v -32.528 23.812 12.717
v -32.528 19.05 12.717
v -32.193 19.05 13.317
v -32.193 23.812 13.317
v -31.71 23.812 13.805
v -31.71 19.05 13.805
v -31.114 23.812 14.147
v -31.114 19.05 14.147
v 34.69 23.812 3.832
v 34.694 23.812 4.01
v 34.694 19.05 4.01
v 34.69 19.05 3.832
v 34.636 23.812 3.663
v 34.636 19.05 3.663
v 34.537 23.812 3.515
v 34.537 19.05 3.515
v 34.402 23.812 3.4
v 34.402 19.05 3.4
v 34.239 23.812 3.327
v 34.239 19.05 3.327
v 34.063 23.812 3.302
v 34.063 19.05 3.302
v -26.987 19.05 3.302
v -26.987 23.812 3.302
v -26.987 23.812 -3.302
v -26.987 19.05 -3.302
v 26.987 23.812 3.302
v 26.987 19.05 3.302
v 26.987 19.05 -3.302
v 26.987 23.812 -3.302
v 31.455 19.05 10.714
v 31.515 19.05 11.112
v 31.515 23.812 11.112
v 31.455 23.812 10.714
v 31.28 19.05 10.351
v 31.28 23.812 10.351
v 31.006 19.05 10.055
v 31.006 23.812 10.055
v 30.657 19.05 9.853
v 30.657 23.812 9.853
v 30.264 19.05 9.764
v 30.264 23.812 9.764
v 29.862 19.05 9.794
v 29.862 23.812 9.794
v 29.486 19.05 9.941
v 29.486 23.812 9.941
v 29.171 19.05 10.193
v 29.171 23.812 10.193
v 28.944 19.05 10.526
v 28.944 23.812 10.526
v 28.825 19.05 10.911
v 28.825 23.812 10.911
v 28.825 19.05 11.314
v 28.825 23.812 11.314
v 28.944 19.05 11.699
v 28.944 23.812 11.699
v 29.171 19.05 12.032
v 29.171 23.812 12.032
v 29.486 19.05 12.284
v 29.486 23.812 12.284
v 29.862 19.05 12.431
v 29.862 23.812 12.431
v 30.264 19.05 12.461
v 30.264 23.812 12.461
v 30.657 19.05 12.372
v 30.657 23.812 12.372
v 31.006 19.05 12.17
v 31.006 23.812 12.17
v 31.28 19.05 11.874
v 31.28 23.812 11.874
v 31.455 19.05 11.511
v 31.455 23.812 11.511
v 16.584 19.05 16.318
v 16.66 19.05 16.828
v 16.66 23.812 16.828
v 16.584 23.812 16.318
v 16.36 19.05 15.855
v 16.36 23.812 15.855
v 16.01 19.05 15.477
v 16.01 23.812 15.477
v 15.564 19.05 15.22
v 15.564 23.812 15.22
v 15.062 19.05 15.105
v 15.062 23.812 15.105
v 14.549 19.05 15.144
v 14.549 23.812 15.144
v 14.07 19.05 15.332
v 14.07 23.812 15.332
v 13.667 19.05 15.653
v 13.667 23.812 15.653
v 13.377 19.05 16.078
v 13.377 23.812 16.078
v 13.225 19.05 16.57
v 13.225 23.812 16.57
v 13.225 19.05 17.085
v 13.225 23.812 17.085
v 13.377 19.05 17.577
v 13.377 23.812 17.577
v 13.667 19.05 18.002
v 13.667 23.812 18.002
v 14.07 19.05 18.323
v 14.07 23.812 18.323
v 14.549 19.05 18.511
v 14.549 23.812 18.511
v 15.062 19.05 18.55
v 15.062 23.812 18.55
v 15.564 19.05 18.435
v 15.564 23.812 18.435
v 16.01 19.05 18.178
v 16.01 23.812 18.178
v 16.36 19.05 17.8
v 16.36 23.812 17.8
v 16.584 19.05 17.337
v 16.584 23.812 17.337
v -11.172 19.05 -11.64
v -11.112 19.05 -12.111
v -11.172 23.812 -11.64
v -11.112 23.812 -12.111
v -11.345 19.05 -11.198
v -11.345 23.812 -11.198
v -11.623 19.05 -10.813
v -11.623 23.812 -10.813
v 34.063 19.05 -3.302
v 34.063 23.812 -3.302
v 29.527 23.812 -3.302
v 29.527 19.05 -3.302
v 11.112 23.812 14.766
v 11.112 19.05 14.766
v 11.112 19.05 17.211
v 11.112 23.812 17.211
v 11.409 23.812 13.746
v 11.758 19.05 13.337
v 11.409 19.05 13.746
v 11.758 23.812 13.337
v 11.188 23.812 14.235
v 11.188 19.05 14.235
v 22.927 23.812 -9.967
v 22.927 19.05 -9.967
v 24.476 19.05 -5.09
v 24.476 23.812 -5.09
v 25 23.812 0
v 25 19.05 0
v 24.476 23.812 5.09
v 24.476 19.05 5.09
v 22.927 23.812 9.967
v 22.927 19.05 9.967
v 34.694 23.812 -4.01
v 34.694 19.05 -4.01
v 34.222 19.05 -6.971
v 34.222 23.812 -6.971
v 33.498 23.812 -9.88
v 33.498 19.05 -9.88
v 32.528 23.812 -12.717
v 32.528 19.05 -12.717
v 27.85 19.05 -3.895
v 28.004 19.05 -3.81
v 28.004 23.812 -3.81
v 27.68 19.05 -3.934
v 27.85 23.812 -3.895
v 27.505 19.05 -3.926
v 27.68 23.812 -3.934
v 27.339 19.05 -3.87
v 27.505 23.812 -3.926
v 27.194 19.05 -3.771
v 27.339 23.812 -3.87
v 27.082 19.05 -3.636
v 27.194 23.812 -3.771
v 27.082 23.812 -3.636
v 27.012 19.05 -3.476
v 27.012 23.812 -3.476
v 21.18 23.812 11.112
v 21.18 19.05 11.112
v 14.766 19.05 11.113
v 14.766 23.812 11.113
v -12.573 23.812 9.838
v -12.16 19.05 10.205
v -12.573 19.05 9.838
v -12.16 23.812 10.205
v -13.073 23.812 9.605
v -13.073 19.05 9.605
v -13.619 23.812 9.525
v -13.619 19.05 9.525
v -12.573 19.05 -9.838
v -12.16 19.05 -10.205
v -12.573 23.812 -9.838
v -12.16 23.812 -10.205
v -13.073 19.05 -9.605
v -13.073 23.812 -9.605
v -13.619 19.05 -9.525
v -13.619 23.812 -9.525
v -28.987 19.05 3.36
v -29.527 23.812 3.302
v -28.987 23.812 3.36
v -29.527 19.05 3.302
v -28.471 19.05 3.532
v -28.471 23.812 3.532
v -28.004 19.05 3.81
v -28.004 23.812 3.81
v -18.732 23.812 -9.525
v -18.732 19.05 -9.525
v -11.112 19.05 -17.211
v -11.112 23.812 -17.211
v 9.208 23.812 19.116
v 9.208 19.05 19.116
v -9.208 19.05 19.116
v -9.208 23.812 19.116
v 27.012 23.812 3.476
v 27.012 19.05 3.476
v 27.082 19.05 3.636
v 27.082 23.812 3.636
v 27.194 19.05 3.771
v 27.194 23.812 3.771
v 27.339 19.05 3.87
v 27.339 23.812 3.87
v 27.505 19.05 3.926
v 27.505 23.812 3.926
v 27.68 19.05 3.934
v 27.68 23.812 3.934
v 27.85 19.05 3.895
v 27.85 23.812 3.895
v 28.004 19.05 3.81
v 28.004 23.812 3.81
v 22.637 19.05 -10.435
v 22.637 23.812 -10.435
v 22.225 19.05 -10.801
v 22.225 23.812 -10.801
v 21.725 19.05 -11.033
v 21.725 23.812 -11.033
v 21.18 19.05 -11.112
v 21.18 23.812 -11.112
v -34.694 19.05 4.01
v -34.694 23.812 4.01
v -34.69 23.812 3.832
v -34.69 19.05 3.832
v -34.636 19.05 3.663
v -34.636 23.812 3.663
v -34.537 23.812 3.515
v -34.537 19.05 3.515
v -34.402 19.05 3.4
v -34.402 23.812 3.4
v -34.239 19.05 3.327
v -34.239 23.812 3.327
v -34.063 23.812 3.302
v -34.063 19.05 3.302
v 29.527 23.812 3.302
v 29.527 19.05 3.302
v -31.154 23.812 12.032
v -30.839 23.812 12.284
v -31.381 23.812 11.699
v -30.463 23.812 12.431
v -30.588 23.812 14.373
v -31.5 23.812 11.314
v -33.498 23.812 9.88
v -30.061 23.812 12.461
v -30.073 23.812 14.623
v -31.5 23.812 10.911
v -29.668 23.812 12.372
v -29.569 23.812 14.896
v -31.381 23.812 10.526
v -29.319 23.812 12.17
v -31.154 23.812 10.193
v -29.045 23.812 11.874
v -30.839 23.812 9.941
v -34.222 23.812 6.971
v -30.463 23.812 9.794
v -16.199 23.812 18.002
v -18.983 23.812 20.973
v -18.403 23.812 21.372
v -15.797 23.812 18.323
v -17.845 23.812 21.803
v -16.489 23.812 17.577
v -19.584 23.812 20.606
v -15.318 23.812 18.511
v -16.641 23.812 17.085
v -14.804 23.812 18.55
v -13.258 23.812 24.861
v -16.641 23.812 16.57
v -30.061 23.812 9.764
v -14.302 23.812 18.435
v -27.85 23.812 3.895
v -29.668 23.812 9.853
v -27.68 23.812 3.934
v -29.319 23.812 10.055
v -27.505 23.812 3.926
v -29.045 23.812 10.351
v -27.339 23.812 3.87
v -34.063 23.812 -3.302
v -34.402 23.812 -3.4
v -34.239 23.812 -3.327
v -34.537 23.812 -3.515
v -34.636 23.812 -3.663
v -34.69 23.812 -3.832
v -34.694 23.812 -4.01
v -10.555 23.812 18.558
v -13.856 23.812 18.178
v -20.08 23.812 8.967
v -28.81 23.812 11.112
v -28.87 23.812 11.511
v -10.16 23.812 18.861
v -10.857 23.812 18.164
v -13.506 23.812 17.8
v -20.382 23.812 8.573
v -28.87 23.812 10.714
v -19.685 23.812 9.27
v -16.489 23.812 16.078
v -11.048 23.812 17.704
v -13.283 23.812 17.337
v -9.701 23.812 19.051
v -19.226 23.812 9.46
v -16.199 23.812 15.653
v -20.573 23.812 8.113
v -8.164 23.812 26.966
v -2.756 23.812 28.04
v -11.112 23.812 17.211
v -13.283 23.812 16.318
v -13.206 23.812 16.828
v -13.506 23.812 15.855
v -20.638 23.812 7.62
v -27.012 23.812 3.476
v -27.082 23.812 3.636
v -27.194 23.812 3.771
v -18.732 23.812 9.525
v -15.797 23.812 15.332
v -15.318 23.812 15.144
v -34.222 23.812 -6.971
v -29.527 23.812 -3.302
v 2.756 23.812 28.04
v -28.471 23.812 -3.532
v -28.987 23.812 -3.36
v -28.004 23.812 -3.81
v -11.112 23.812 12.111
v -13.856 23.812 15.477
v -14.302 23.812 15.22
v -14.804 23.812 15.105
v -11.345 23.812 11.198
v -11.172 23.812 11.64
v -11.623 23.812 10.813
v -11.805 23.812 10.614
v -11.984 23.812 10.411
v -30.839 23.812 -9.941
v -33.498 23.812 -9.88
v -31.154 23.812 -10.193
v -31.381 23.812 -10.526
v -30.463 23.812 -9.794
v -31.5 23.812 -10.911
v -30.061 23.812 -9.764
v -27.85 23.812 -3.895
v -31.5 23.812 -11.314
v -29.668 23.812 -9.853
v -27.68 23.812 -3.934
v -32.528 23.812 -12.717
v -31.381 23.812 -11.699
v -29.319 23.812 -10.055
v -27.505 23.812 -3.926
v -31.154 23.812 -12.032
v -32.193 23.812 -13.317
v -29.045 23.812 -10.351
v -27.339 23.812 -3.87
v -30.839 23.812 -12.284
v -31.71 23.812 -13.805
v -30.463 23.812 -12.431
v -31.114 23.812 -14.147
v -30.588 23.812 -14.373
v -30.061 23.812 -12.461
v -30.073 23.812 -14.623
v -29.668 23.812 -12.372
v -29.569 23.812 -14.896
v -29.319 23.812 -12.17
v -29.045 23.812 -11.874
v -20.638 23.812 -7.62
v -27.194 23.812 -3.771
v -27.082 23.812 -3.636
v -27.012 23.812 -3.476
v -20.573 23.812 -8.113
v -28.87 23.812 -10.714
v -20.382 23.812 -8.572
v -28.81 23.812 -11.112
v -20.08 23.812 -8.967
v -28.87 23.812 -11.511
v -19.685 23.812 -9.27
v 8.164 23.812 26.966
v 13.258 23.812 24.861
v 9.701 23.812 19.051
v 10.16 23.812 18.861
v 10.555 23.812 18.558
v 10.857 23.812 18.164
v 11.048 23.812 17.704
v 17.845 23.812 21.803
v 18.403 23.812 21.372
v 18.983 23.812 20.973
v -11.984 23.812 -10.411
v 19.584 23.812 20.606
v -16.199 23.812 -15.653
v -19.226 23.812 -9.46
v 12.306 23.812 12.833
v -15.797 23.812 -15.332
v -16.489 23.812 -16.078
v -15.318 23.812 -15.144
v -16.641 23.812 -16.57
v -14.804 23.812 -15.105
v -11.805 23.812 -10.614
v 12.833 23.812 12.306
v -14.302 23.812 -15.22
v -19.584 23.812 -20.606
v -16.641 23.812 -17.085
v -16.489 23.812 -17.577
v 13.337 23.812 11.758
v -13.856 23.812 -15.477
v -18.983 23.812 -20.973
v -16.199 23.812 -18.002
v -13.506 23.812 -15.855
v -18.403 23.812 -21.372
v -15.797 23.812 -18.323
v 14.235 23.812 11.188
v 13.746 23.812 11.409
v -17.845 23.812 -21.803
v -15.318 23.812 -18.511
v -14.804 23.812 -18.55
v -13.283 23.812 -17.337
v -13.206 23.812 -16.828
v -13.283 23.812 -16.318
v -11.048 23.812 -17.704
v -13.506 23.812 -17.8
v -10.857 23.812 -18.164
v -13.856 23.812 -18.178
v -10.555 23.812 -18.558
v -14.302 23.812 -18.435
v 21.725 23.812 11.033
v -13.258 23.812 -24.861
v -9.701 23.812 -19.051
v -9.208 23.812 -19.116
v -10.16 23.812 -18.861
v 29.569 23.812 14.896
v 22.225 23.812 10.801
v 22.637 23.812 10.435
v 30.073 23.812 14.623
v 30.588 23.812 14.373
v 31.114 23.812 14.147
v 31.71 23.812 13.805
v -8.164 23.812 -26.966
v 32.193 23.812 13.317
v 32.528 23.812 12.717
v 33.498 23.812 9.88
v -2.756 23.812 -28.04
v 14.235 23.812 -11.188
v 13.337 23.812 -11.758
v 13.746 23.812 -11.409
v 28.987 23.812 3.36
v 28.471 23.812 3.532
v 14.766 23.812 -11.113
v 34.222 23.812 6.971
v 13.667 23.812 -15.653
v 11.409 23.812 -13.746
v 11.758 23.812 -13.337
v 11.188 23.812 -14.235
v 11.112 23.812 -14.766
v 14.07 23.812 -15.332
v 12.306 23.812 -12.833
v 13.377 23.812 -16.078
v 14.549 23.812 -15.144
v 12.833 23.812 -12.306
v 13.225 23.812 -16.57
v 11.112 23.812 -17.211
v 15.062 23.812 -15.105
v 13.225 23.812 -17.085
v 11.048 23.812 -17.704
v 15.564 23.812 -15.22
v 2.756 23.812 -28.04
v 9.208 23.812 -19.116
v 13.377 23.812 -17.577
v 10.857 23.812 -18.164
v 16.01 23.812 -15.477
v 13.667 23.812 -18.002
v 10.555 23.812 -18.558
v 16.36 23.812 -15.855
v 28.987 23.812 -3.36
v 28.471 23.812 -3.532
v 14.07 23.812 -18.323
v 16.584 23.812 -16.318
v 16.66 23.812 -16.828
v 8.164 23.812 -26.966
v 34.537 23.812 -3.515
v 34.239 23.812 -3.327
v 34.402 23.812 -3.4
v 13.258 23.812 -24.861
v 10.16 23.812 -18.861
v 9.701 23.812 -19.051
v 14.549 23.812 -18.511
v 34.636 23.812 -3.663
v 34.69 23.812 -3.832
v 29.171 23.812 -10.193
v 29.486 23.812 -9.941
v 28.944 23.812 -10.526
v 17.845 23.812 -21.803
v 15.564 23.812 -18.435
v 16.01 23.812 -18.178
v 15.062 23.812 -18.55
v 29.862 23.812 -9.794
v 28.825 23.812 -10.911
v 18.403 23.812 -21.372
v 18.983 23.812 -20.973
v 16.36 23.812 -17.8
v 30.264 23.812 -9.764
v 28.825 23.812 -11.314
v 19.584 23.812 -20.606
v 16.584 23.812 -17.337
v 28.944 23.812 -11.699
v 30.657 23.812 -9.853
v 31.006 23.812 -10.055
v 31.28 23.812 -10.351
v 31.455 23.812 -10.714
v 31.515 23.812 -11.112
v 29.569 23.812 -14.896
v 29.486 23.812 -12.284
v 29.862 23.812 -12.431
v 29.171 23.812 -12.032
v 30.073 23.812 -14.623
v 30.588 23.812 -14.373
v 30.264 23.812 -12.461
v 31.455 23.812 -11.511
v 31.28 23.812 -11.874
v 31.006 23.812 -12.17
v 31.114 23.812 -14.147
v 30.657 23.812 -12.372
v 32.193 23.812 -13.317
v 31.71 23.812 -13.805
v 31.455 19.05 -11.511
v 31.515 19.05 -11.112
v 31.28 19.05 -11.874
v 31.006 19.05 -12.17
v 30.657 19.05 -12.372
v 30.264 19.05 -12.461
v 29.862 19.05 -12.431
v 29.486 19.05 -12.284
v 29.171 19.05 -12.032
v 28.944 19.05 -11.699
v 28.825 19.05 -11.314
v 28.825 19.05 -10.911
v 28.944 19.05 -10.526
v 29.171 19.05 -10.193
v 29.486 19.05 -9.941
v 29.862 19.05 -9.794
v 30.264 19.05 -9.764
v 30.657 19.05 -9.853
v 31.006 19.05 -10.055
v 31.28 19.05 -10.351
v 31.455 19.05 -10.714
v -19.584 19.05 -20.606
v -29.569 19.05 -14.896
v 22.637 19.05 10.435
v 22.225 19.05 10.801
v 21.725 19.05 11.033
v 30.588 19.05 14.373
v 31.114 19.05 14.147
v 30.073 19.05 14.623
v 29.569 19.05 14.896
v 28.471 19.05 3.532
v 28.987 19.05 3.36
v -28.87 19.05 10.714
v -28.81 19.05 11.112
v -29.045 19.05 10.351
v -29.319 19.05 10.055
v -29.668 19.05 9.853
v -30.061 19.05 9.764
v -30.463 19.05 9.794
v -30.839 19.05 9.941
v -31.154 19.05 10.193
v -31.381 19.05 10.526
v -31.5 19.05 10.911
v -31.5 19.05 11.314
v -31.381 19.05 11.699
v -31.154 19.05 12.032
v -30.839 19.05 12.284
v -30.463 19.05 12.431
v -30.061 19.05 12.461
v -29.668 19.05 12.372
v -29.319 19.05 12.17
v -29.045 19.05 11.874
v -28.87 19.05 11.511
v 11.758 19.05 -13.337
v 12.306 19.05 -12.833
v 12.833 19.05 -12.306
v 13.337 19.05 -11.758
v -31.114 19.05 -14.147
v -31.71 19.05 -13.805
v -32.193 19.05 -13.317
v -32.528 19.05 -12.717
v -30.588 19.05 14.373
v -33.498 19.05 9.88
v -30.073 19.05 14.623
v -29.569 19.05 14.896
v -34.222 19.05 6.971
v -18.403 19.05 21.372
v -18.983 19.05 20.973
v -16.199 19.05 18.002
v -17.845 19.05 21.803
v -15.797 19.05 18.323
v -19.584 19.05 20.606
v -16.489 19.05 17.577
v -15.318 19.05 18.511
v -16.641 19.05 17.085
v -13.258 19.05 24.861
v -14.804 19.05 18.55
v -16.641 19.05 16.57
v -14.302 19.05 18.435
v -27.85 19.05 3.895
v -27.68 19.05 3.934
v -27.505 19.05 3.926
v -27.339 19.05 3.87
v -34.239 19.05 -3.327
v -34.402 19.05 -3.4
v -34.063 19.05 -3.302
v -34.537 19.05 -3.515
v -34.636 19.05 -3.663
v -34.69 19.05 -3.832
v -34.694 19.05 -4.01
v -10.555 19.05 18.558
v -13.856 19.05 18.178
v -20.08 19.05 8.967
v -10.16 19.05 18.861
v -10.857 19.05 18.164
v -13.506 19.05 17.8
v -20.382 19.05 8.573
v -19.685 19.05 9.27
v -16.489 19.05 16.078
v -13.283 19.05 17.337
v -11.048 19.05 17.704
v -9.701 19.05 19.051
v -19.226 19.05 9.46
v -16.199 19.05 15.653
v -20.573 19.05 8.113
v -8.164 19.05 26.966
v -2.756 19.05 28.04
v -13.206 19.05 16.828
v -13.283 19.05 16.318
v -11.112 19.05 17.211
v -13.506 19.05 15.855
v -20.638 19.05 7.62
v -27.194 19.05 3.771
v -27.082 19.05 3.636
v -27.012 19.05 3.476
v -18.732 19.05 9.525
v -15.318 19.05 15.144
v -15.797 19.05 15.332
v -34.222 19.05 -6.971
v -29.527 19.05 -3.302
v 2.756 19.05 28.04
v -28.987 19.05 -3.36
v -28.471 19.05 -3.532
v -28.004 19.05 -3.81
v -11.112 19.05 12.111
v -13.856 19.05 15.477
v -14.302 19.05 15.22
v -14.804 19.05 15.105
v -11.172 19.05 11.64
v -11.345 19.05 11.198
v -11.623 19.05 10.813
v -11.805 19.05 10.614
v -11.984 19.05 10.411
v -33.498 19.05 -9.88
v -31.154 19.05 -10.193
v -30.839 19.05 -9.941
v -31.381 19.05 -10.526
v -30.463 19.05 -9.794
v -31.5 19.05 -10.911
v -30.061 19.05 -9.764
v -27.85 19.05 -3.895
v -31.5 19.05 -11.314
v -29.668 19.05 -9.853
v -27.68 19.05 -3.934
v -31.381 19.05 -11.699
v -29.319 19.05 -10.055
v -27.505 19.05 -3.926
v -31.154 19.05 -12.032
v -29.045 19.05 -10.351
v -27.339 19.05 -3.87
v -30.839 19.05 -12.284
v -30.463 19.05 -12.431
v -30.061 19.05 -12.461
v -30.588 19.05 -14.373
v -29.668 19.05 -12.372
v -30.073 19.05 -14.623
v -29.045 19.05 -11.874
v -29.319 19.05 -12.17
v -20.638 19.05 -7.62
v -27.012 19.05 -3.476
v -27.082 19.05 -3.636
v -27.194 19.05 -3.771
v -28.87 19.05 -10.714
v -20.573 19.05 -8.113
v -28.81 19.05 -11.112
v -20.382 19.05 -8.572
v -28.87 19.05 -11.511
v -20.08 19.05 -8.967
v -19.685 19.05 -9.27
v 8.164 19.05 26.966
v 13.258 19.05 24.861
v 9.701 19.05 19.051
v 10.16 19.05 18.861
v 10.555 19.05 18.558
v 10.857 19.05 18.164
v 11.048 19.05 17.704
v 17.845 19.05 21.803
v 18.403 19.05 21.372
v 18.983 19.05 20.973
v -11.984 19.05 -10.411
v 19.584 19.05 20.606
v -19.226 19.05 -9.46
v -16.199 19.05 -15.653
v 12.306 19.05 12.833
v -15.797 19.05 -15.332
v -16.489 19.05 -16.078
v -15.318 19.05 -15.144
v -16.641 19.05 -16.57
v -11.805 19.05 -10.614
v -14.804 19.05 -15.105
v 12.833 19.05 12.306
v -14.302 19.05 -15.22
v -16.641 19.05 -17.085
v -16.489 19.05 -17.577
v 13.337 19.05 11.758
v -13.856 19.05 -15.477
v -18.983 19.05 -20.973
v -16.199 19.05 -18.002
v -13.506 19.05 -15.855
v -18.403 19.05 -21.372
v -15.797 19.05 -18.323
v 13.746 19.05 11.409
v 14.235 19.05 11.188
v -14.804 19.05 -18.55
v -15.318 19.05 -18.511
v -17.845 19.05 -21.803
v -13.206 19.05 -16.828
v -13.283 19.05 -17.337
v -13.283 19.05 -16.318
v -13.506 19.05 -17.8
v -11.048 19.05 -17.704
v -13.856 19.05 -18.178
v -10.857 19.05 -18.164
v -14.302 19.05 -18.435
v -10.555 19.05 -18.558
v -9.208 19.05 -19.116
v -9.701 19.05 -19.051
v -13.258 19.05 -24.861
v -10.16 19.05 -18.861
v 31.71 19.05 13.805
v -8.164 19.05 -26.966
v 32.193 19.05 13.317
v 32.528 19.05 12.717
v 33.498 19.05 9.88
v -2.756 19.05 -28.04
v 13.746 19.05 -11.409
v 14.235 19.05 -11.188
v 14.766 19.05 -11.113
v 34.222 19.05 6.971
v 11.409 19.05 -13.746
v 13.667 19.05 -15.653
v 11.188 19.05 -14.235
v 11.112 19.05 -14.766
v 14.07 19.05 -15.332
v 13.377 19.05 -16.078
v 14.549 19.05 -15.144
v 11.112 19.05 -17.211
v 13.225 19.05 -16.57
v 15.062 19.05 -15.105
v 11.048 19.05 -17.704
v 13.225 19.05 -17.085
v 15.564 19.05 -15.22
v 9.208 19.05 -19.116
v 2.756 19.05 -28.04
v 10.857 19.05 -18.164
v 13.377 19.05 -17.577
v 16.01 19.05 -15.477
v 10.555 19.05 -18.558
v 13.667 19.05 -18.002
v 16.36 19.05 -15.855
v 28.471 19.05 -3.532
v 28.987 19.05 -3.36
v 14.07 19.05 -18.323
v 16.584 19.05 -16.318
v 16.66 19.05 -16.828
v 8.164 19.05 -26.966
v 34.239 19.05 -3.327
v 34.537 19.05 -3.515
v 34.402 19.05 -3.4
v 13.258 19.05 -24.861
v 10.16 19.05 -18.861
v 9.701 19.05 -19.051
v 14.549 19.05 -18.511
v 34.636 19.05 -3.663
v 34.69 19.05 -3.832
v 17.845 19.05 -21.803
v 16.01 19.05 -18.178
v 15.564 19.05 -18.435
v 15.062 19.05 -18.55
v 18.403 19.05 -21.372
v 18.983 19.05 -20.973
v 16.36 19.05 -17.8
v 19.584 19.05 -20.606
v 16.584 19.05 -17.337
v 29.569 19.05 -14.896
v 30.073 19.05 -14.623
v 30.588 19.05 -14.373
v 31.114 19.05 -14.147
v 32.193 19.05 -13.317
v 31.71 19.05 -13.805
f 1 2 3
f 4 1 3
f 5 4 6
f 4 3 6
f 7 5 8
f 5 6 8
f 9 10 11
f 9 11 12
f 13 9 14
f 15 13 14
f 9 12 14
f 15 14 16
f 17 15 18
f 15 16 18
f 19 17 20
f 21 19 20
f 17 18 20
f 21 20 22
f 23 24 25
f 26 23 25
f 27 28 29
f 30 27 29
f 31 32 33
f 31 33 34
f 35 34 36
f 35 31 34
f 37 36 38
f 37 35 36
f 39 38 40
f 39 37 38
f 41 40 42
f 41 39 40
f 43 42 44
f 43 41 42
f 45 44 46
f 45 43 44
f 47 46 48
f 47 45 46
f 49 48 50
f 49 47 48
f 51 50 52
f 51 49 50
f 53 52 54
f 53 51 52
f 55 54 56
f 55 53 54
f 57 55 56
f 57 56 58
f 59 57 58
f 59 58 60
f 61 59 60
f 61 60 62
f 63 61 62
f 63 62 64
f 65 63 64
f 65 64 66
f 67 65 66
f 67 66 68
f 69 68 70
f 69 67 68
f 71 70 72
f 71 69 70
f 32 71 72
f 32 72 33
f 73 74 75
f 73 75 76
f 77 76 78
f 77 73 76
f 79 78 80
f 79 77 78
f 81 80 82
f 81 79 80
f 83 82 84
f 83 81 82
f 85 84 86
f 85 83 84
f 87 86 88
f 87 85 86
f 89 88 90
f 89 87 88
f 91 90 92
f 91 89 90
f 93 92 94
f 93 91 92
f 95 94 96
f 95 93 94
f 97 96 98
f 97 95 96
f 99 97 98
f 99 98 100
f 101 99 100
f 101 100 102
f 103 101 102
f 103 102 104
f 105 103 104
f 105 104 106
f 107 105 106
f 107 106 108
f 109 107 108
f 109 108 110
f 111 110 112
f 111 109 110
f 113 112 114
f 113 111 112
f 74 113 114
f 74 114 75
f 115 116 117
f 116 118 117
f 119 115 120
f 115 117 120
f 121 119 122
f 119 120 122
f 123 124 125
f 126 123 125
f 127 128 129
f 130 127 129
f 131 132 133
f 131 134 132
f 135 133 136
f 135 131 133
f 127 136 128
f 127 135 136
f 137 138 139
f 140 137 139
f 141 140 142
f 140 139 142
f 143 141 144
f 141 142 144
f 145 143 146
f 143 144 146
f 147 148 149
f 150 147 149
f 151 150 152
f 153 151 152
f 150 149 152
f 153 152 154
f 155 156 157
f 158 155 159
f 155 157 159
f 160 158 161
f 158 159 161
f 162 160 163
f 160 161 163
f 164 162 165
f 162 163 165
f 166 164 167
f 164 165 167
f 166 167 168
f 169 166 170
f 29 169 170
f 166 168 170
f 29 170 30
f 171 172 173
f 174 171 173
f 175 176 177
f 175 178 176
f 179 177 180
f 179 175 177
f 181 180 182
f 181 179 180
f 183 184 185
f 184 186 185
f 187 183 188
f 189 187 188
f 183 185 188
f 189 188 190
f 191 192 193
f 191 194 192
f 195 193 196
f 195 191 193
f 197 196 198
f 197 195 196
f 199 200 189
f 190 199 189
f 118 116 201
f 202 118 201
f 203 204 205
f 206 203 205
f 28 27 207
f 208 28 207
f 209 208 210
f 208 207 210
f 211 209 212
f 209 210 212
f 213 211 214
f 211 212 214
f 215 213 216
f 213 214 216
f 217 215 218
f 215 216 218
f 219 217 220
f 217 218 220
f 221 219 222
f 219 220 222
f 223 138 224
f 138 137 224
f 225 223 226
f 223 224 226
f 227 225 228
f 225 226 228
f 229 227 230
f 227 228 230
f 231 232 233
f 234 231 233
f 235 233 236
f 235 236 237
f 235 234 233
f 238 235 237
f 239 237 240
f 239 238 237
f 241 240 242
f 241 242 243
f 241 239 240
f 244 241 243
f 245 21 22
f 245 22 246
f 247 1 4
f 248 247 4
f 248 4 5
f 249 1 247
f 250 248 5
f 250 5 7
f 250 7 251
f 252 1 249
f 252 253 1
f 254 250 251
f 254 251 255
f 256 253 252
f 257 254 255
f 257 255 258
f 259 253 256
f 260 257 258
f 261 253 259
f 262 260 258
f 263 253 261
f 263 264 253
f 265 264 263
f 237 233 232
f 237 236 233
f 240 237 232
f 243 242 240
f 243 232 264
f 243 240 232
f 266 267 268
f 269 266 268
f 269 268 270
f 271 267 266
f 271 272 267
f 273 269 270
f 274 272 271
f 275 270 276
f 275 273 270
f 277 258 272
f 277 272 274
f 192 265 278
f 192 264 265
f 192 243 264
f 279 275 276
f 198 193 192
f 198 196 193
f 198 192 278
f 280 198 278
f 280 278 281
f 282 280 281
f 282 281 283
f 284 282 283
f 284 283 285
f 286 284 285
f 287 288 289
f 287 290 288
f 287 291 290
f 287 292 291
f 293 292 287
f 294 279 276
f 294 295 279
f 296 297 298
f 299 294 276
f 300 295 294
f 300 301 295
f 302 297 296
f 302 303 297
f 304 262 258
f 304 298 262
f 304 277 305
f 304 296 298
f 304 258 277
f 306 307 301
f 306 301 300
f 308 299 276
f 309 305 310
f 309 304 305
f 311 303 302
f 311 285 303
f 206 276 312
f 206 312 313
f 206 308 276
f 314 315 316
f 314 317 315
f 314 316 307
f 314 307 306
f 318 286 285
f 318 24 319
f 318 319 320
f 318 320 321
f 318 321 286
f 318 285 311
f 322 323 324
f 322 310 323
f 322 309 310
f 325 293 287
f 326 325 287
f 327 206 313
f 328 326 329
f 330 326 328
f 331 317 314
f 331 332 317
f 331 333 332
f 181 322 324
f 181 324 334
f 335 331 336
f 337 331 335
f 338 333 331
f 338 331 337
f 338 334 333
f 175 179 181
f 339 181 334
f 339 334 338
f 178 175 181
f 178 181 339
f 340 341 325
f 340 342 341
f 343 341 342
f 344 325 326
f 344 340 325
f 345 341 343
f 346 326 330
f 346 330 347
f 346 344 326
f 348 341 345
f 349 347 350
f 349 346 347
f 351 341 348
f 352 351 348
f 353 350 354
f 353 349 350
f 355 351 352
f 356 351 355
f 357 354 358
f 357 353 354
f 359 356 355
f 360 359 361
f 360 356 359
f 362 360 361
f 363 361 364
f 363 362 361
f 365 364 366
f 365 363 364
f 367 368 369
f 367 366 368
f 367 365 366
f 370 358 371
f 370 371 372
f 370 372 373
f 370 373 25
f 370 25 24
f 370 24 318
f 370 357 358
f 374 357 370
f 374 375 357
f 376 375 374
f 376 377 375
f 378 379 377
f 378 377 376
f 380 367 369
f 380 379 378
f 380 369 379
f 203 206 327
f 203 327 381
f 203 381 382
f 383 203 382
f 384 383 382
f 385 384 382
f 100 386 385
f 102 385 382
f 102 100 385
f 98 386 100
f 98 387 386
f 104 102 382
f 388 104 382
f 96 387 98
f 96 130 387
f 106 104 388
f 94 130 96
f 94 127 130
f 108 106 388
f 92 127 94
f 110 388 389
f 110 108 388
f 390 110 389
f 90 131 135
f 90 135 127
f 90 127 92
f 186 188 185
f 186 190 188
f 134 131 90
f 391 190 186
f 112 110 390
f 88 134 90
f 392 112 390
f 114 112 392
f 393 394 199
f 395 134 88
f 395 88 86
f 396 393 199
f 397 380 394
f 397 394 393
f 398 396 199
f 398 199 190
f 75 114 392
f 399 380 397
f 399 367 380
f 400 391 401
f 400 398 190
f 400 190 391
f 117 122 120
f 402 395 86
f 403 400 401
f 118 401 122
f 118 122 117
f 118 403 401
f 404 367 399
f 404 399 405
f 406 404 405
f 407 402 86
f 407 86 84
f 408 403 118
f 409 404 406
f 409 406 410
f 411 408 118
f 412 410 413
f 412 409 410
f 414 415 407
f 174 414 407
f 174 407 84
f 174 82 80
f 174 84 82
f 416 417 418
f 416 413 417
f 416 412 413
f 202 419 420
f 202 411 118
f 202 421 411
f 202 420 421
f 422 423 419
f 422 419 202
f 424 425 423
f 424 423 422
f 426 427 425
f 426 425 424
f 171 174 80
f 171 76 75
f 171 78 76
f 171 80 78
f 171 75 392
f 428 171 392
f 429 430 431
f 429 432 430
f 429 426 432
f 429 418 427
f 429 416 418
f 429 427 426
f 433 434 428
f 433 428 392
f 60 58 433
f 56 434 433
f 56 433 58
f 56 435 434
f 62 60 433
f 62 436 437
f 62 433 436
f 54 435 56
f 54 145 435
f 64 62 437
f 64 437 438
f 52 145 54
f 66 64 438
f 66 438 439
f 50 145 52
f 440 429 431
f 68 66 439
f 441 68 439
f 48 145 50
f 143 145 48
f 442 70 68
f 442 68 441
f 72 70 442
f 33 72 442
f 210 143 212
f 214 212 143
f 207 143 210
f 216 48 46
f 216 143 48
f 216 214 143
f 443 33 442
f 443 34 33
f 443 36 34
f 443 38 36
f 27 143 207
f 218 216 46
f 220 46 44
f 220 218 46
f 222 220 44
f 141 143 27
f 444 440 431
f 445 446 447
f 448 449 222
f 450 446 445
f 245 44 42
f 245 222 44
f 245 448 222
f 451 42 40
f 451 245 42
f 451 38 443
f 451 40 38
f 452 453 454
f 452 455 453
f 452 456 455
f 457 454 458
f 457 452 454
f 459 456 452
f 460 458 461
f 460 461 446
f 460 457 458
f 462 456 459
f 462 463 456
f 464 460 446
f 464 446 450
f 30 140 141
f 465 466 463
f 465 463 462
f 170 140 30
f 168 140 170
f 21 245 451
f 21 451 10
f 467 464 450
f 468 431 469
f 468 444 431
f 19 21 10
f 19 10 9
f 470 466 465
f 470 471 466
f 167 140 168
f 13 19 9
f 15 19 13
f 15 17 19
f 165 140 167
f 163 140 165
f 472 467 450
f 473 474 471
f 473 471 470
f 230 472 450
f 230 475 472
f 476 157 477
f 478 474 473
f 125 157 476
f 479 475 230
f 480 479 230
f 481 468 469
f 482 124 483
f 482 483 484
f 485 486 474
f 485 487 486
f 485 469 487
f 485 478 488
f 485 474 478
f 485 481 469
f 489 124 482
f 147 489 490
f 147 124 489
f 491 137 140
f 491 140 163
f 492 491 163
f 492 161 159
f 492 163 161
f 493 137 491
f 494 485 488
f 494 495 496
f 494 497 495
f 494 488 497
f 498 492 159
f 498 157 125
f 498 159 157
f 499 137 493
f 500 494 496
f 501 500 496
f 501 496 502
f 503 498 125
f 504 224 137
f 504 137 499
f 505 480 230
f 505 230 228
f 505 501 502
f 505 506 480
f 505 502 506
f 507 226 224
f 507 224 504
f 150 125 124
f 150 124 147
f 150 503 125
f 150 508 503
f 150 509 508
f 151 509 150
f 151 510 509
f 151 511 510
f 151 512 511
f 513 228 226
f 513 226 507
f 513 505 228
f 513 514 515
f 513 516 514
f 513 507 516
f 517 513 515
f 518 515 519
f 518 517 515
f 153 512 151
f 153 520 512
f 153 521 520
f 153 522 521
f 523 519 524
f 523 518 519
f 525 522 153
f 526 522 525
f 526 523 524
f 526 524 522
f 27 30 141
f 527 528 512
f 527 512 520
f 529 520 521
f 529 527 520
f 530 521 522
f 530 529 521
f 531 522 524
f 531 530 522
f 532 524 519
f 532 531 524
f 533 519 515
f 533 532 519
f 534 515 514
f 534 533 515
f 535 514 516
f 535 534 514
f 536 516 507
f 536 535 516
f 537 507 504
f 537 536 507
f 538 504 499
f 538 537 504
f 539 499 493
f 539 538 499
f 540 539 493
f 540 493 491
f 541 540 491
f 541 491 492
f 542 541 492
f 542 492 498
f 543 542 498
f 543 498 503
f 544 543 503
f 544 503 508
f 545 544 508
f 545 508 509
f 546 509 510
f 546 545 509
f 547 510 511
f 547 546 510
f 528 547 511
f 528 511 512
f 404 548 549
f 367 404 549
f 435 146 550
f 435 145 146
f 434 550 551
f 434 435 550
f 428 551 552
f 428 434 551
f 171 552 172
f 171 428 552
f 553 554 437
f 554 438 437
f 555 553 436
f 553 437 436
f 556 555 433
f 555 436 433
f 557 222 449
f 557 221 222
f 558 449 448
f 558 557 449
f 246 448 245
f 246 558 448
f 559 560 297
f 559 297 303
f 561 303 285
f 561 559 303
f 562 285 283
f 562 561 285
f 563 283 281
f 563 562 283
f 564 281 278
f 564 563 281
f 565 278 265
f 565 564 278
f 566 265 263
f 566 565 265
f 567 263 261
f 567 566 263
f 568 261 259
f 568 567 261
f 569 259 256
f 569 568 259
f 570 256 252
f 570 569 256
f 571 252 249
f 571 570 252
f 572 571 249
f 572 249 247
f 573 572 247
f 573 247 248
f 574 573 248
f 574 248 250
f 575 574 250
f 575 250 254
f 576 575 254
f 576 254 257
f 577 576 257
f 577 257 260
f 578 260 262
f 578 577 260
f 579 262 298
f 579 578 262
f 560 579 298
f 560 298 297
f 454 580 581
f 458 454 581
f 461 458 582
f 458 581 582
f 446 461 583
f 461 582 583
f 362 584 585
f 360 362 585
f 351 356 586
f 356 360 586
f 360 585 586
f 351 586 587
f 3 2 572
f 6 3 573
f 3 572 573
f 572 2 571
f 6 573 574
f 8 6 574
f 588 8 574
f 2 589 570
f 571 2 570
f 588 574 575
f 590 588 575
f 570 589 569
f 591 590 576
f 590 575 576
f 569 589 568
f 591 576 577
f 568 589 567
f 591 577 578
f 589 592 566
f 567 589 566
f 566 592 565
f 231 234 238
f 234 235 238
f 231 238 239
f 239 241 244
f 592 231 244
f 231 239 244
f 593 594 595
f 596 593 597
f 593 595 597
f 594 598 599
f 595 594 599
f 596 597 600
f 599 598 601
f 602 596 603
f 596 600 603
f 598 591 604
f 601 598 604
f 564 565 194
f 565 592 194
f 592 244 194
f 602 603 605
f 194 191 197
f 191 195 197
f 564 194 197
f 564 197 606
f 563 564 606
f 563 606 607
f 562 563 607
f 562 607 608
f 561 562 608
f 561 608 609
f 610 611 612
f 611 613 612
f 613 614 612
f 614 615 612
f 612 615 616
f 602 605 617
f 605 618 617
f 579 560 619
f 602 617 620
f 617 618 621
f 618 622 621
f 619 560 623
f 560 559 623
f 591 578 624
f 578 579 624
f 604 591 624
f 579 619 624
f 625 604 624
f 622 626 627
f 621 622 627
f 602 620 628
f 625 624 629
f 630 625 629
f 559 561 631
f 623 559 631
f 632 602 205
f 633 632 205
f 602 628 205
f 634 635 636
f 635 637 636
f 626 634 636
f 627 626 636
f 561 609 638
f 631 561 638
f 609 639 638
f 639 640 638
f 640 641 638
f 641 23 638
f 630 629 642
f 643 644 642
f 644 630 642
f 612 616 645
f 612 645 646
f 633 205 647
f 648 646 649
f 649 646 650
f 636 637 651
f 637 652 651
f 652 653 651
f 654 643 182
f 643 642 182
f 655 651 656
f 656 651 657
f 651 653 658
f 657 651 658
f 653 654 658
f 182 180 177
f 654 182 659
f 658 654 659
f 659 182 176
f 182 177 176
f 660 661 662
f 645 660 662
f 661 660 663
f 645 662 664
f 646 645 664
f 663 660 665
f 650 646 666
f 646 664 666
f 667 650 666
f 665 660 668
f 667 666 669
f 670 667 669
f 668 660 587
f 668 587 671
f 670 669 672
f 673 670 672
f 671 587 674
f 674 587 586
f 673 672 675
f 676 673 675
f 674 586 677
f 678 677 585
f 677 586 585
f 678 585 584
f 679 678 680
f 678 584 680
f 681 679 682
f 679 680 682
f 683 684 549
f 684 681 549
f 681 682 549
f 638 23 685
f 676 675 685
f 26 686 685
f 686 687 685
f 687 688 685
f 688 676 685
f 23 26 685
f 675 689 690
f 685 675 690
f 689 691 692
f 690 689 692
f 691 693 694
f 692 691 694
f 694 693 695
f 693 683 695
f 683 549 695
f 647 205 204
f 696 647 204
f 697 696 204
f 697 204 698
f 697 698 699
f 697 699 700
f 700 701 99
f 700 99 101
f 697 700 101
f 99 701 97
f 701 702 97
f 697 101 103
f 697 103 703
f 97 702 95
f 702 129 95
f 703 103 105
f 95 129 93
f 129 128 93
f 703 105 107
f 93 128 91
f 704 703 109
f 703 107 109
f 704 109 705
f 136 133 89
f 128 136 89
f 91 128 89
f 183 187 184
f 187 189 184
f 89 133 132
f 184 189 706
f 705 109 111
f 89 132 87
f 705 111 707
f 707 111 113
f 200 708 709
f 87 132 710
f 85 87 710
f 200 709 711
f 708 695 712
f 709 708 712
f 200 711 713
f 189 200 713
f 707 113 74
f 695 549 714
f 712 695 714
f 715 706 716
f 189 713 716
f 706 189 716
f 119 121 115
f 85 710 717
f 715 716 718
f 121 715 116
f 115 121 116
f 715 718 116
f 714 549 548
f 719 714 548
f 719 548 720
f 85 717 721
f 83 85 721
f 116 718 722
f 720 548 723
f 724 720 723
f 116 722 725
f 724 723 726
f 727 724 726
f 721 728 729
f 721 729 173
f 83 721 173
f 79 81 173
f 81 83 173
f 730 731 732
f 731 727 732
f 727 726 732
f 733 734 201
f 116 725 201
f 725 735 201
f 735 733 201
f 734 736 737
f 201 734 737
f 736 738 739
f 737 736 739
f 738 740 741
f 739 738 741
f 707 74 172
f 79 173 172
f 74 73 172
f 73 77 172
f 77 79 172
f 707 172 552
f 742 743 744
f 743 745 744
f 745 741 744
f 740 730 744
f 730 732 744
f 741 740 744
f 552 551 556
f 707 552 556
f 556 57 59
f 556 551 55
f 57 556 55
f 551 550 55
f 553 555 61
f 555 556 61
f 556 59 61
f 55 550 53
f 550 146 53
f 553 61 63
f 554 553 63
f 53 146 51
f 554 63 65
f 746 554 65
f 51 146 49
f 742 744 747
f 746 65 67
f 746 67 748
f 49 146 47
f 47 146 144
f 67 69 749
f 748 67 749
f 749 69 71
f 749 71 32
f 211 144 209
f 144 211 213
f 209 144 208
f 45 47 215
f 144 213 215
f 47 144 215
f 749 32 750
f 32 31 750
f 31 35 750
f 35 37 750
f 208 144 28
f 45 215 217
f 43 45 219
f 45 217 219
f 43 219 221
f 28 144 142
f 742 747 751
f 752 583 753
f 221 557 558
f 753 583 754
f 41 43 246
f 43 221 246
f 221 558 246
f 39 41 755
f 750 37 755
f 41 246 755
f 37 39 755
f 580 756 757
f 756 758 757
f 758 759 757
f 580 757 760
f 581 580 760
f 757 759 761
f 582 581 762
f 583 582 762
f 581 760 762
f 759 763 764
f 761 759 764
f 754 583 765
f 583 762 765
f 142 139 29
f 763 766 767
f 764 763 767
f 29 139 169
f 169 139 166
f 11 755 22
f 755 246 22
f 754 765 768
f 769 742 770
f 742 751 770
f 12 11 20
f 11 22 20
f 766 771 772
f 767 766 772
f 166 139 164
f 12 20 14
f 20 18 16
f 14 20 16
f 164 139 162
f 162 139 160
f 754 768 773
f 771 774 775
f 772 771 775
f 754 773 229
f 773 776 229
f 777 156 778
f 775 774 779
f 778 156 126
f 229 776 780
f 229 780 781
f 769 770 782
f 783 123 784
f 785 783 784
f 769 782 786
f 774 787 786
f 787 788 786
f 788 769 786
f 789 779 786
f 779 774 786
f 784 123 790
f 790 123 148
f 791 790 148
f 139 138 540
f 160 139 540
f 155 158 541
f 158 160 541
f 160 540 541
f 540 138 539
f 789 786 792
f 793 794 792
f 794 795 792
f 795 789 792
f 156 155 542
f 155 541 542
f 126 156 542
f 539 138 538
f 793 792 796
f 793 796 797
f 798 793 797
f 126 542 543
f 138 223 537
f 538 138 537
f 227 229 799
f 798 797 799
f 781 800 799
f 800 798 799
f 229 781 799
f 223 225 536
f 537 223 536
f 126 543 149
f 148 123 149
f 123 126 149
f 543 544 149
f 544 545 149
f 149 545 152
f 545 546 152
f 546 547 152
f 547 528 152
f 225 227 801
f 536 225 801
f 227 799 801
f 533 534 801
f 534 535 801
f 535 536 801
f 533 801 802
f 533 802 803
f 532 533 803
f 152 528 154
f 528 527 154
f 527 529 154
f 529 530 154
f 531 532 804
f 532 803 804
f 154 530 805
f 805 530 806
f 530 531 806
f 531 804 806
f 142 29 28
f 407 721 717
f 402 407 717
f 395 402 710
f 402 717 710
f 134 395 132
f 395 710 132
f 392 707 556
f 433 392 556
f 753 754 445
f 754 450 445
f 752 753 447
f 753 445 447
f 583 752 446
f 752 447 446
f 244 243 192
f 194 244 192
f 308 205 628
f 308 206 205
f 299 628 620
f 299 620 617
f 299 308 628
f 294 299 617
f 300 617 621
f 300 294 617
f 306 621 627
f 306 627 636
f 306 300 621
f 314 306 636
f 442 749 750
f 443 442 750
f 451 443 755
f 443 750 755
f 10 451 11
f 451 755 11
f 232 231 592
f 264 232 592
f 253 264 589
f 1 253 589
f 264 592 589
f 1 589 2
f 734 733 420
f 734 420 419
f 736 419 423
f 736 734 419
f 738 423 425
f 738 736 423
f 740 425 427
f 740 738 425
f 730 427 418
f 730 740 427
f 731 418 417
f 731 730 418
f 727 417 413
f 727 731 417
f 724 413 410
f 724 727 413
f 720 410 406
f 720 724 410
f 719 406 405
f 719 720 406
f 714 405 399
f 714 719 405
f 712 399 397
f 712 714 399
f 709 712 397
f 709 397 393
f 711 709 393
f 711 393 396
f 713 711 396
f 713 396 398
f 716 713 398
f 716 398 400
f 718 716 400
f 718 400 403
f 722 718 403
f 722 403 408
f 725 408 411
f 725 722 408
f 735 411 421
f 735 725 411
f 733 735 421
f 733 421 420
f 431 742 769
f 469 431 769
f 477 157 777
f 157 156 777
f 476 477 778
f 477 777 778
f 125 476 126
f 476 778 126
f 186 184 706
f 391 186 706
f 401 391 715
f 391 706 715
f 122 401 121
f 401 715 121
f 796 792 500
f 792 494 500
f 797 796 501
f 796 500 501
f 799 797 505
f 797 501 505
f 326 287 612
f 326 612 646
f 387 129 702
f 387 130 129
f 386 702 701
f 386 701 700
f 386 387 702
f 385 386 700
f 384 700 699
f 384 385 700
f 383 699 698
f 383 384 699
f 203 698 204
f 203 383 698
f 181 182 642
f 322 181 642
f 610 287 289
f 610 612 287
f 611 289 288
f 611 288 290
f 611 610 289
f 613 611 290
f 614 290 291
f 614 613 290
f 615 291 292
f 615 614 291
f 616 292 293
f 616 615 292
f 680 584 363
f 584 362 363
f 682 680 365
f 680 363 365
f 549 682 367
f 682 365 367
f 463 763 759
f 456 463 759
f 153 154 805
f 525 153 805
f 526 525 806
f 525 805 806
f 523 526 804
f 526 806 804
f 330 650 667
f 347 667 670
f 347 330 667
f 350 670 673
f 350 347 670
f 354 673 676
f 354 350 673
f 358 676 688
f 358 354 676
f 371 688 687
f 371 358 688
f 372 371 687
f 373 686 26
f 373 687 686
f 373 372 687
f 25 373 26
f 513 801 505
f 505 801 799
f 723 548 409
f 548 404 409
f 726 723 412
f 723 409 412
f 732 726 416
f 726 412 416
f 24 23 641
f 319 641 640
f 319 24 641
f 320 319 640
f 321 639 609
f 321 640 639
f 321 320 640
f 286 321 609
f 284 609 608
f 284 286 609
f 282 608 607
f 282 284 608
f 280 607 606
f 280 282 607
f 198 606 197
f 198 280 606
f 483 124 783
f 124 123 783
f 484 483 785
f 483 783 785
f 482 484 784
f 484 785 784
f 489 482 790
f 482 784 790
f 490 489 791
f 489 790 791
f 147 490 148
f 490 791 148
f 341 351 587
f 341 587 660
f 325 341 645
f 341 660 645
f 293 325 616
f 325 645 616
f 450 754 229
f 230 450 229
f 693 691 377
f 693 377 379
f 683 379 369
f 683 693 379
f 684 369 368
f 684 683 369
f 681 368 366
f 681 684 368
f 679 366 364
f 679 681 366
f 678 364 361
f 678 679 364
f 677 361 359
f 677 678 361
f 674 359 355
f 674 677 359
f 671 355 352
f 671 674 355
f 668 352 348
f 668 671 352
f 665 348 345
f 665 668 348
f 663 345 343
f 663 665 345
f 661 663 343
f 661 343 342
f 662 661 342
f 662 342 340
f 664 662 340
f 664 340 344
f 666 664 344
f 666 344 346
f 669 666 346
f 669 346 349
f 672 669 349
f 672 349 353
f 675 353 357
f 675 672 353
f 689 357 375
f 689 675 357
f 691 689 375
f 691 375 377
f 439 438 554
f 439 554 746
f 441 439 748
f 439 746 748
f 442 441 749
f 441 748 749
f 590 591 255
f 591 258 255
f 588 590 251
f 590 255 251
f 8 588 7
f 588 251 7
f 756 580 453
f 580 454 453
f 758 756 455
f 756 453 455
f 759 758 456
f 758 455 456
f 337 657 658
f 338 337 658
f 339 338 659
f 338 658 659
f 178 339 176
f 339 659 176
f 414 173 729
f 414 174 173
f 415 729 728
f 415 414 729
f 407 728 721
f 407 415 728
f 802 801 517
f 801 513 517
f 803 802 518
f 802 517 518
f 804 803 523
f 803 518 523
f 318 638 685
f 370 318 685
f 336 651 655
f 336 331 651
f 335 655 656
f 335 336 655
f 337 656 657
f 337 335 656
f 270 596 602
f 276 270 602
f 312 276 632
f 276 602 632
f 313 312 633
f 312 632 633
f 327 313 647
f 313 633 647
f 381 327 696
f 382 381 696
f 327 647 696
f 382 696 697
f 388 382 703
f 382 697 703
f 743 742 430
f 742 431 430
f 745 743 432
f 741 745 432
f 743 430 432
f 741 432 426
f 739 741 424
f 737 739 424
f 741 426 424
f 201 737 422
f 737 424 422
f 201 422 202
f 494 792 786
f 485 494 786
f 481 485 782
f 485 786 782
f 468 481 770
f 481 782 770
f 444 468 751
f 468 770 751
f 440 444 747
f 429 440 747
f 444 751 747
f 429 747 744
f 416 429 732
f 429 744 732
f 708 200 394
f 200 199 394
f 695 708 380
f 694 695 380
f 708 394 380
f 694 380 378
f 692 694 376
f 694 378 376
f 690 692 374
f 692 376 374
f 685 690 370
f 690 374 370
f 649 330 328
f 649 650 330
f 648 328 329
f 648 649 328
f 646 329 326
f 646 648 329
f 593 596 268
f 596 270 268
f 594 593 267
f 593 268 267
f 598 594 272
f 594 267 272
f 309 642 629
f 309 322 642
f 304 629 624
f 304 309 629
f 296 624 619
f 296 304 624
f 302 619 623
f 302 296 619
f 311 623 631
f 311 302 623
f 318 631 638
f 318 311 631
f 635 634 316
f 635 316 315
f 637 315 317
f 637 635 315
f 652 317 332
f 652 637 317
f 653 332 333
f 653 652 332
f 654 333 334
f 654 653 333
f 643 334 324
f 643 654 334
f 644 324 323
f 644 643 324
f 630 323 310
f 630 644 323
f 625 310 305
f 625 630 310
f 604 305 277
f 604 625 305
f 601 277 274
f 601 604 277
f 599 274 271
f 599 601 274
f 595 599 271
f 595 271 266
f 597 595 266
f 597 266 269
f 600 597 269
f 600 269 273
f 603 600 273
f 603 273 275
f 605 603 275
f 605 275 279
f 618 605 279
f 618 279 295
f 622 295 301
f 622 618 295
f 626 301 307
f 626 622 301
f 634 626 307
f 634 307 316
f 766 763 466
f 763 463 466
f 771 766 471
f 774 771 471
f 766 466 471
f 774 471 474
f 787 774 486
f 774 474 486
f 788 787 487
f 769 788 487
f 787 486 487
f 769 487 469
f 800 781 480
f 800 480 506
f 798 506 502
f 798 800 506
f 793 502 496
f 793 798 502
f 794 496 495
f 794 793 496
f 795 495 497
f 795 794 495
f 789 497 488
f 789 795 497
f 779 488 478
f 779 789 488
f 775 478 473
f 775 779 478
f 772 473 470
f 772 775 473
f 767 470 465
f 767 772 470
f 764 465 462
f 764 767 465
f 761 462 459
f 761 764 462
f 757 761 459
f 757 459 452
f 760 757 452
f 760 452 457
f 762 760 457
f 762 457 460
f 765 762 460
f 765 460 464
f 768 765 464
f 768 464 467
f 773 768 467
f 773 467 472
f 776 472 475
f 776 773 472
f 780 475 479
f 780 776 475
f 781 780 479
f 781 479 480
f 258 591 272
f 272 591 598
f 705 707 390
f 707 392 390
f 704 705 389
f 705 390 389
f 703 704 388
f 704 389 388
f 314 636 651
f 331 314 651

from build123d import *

# Parameters (mm, degrees)
STOCK_DGT_START                               = 19.05
STOCK_DGT_INSIDE_SWERVE_STRUCTURE_SM_2_R      = 1.7272
STOCK_DGT_INSIDE_SWERVE_STRUCTURE_SM_2_R_2    = 1.35255
STOCK_DGT_INSIDE_SWERVE_STRUCTURE_SMALL_DEPTH = 4.7625
SKETCH2_W                                     = 7.792882402
SKETCH2_H                                     = 6.604
CUT_EXTRUDE2_DEPTH                            = 46.013187304
CUT_EXTRUDE1_DEPTH                            = 46.013187304
FILLET1_R                                     = 2.54
FILLET2_R                                     = 2.54
FILLET3_R                                     = 12.7
FILLET4_R                                     = 1.905
FILLET5_R                                     = 0.635


# Read off the part's stored shape, not the designer's step: Stock-DGT inside swerve structure Small Bearing-1
with BuildPart() as part:
    # Stock-DGT inside swerve structure Sm 2 → Stock-DGT inside swerve structure Small Bearing-1 (new body)
    with BuildSketch(Plane(origin=(0, 0, 0), x_dir=(1, 0, 0), z_dir=(0, 1, 0)).offset(STOCK_DGT_START)):
        with BuildLine():
            Line((26.9875, 3.175), (34.780382402, 3.175))
            ThreePointArc((34.780382402, 3.175), (33.784635987, 8.851779269), (31.868840091, 14.2875))
            Line((31.868840091, 14.2875), (30.633697592, 14.2875))
            Line((30.633697592, 14.2875), (18.578944076, 21.181441452))
            ThreePointArc((18.578944076, 21.181441452), (0, 28.175), (-18.578944076, 21.181441452))
            Line((-18.578944076, 21.181441452), (-30.633697592, 14.2875))
            Line((-30.633697592, 14.2875), (-31.868840091, 14.2875))
            ThreePointArc((-31.868840091, 14.2875), (-33.784635987, 8.851779269), (-34.780382402, 3.175))
            Line((-34.780382402, 3.175), (-26.9875, 3.175))
            Line((-26.9875, 3.175), (-26.9875, -3.175))
            Line((-26.9875, -3.175), (-34.780382402, -3.175))
            ThreePointArc((-34.780382402, -3.175), (-33.784635987, -8.851779269), (-31.868840091, -14.2875))
            Line((-31.868840091, -14.2875), (-30.633697592, -14.2875))
            Line((-30.633697592, -14.2875), (-18.578944076, -21.181441452))
            ThreePointArc((-18.578944076, -21.181441452), (0, -28.175), (18.578944076, -21.181441452))
            Line((18.578944076, -21.181441452), (30.633697592, -14.2875))
            Line((30.633697592, -14.2875), (31.868840091, -14.2875))
            ThreePointArc((31.868840091, -14.2875), (33.784635987, -8.851779269), (34.780382402, -3.175))
            Line((34.780382402, -3.175), (26.9875, -3.175))
            Line((26.9875, -3.175), (26.9875, 3.175))
        make_face()
        with Locations((-14.933176064, -16.8275)):
            Circle(STOCK_DGT_INSIDE_SWERVE_STRUCTURE_SM_2_R, mode=Mode.SUBTRACT)
        with Locations((-30.1625, -11.1125)):
            Circle(STOCK_DGT_INSIDE_SWERVE_STRUCTURE_SM_2_R_2, mode=Mode.SUBTRACT)
        with Locations((14.933176064, -16.8275)):
            Circle(STOCK_DGT_INSIDE_SWERVE_STRUCTURE_SM_2_R, mode=Mode.SUBTRACT)
        with Locations((30.1625, -11.1125)):
            Circle(STOCK_DGT_INSIDE_SWERVE_STRUCTURE_SM_2_R_2, mode=Mode.SUBTRACT)
        with Locations((-30.1625, 11.1125)):
            Circle(STOCK_DGT_INSIDE_SWERVE_STRUCTURE_SM_2_R_2, mode=Mode.SUBTRACT)
        with Locations((-14.933176064, 16.8275)):
            Circle(STOCK_DGT_INSIDE_SWERVE_STRUCTURE_SM_2_R, mode=Mode.SUBTRACT)
        with BuildLine():
            Line((22.394471276, -11.1125), (13.879508051, -11.1125))
            ThreePointArc((13.879508051, -11.1125), (12.572358569, -12.572358569), (11.1125, -13.879508051))
            Line((11.1125, -13.879508051), (11.1125, -19.116031394))
            Line((11.1125, -19.116031394), (-11.1125, -19.116031394))
            Line((-11.1125, -19.116031394), (-11.1125, -11.33701763))
            ThreePointArc((-11.1125, -11.33701763), (-11.940671716, -10.461165517), (-12.7, -9.525))
            Line((-12.7, -9.525), (-20.6375, -9.525))
            Line((-20.6375, -9.525), (-20.6375, 9.525))
            Line((-20.6375, 9.525), (-12.7, 9.525))
            ThreePointArc((-12.7, 9.525), (-11.940671716, 10.461165517), (-11.1125, 11.33701763))
            Line((-11.1125, 11.33701763), (-11.1125, 19.116031394))
            Line((-11.1125, 19.116031394), (11.1125, 19.116031394))
            Line((11.1125, 19.116031394), (11.1125, 13.879508051))
            ThreePointArc((11.1125, 13.879508051), (12.572358569, 12.572358569), (13.879508051, 11.1125))
            Line((13.879508051, 11.1125), (22.394471276, 11.1125))
            ThreePointArc((22.394471276, 11.1125), (25, 0), (22.394471276, -11.1125))
        make_face(mode=Mode.SUBTRACT)
        with Locations((30.1625, 11.1125)):
            Circle(STOCK_DGT_INSIDE_SWERVE_STRUCTURE_SM_2_R_2, mode=Mode.SUBTRACT)
        with Locations((14.933176064, 16.8275)):
            Circle(STOCK_DGT_INSIDE_SWERVE_STRUCTURE_SM_2_R, mode=Mode.SUBTRACT)
    extrude(amount=STOCK_DGT_INSIDE_SWERVE_STRUCTURE_SMALL_DEPTH)

    # Sketch2 → Cut-Extrude2 (cut, through all)
    with BuildSketch(Plane(origin=(0, 23.8125, 0), x_dir=(1, 0, 0), z_dir=(0, 1, 0))):
        with Locations((-30.883941201, 0)):
            Rectangle(SKETCH2_W, SKETCH2_H)
    cut_extrude2 = extrude(amount=-CUT_EXTRUDE2_DEPTH, mode=Mode.SUBTRACT)

    # Sketch1 → Cut-Extrude1 (cut, through all)
    with BuildSketch(Plane(origin=(0, 23.8125, 0), x_dir=(1, 0, 0), z_dir=(0, 1, 0))):
        with BuildLine():
            Line((-28.2575, -3.302), (-28.2575, 3.302))
            ThreePointArc((-28.2575, 3.302), (-27.6225, 3.937), (-26.9875, 3.302))
            Line((-26.9875, 3.302), (-26.9875, -3.302))
            ThreePointArc((-26.9875, -3.302), (-27.6225, -3.937), (-28.2575, -3.302))
        make_face()
    cut_extrude1 = extrude(amount=-CUT_EXTRUDE1_DEPTH, mode=Mode.SUBTRACT)

    # Mirror1: Cut-Extrude2, Cut-Extrude1 across plane
    add(cut_extrude2.mirror(Plane(origin=(0, 0, 0), x_dir=(0, 0, 1), z_dir=(1, 0, 0))), mode=Mode.SUBTRACT)
    add(cut_extrude1.mirror(Plane(origin=(0, 0, 0), x_dir=(0, 0, 1), z_dir=(1, 0, 0))), mode=Mode.SUBTRACT)

    # Fillet1
    fillet1_edges = [part.edges().sort_by_distance(p)[0] for p in [
        (-28.2575, 21.43125, 3.302),
        (-28.2575, 21.43125, -3.302),
        (28.2575, 21.43125, 3.302),
        (28.2575, 21.43125, -3.302),
    ]]
    fillet(fillet1_edges, radius=FILLET1_R)

    # Fillet2
    # the kernel refuses this fillet: 2.54 mm, written as the material it takes off along each edge
    with BuildSketch(Plane(origin=(31.868840091, 14.791233758, -14.2875), x_dir=(-1, 0, 0), z_dir=(0, 1, 0))) as fillet2_piece_1:
        with BuildLine():
            CenterArc((1.70687253, 2.495810645), FILLET2_R, 201.352796162, 57.94406273)
            Line((-0.658771985, 1.570972265), (-0.706084875, 1.552475497))
            ThreePointArc((-0.706084875, 1.552475497), (-0.385813379, 0.761823855), (-0.046354676, -0.020781818))
            Line((-0.046354676, -0.020781818), (0, -0.0508))
            ThreePointArc((0, -0.0508), (0.61757125, -0.0508), (1.225707898, -0.049916213))
            Line((1.225707898, -0.049916213), (1.235142499, 0))
        make_face()
    extrude(amount=13.280032484, mode=Mode.SUBTRACT)
    with BuildSketch(Plane(origin=(31.868840091, 14.791233758, 14.2875), x_dir=(-1, 0, 0), z_dir=(0, 1, 0))) as fillet2_piece_2:
        with BuildLine():
            CenterArc((1.70687253, -2.495810645), FILLET2_R, 100.703141108, 57.94406273)
            Line((-0.658771985, -1.570972265), (-0.706084875, -1.552475497))
            ThreePointArc((-0.706084875, -1.552475497), (-0.385813379, -0.761823855), (-0.046354676, 0.020781818))
            Line((-0.046354676, 0.020781818), (0, 0.0508))
            ThreePointArc((0, 0.0508), (0.61757125, 0.0508), (1.225707898, 0.049916213))
            Line((1.225707898, 0.049916213), (1.235142499, 0))
        make_face()
    extrude(amount=13.280032484, mode=Mode.SUBTRACT)
    with BuildSketch(Plane(origin=(-31.868840091, 14.791233758, 14.2875), x_dir=(-0.3867152758408876, 0, -0.9221991625626789), z_dir=(0, 1, 0))) as fillet2_piece_3:
        with BuildLine():
            CenterArc((1.641560806, -2.53924452), FILLET2_R, 88.602528123, 57.94406273)
            Line((-0.477648472, -1.139047378), (-0.520032658, -1.111043435))
            ThreePointArc((-0.520032658, -1.111043435), (-0.285671954, -0.549878553), (-0.046847717, 0.019645136))
            Line((-0.046847717, 0.019645136), (-0.001238914, 0.05078489))
            ThreePointArc((-0.001238914, 0.05078489), (0.851753248, 0.061187853), (1.704745411, 0.05078489))
            Line((1.704745411, 0.05078489), (1.703506497, 0))
        make_face()
    extrude(amount=13.280032484, mode=Mode.SUBTRACT)
    with BuildSketch(Plane(origin=(-31.868840091, 14.791233758, -14.2875), x_dir=(-0.3867152758408886, 0, 0.9221991625626784), z_dir=(0, 1, 0))) as fillet2_piece_4:
        with BuildLine():
            CenterArc((1.641560806, 2.53924452), FILLET2_R, 213.453409147, 57.94406273)
            Line((-0.477648472, 1.139047378), (-0.520032658, 1.111043435))
            ThreePointArc((-0.520032658, 1.111043435), (-0.285671954, 0.549878553), (-0.046847717, -0.019645136))
            Line((-0.046847717, -0.019645136), (-0.001238914, -0.05078489))
            ThreePointArc((-0.001238914, -0.05078489), (0.851753248, -0.061187853), (1.704745411, -0.05078489))
            Line((1.704745411, -0.05078489), (1.703506497, 0))
        make_face()
    extrude(amount=13.280032484, mode=Mode.SUBTRACT)

    # Fillet3
    fillet3_edges = [part.edges().sort_by_distance(p)[0] for p in [
        (-18.578944076, 21.43125, -21.181441452),
        (18.578944076, 21.43125, -21.181441452),
        (30.633697592, 21.43125, -14.2875),
        (-30.633697592, 21.43125, -14.2875),
        (30.633697592, 21.43125, 14.2875),
        (-18.578944076, 21.43125, 21.181441452),
        (18.578944076, 21.43125, 21.181441452),
        (-30.633697592, 21.43125, 14.2875),
    ]]
    fillet(fillet3_edges, radius=FILLET3_R)

    # Fillet4
    fillet4_edges = [part.edges().sort_by_distance(p)[0] for p in [
        (11.1125, 21.43125, 19.116031394),
        (-11.1125, 21.43125, -19.116031394),
        (11.1125, 21.43125, -19.116031394),
        (-11.1125, 21.43125, 19.116031394),
        (-12.7, 21.43125, -9.525),
        (-12.7, 21.43125, 9.525),
        (-20.6375, 21.43125, 9.525),
        (-20.6375, 21.43125, -9.525),
        (22.394471276, 21.43125, 11.1125),
        (22.394471276, 21.43125, -11.1125),
        (11.1125, 21.43125, -13.879508051),
        (11.1125, 21.43125, 13.879508051),
        (13.879508051, 21.43125, 11.1125),
        (13.879508051, 21.43125, -11.1125),
        (-11.1125, 21.43125, 11.33701763),
        (-11.1125, 21.43125, -11.33701763),
    ]]
    fillet(fillet4_edges, radius=FILLET4_R)

    # Fillet5
    fillet5_edges = [part.edges().sort_by_distance(p)[0] for p in [
        (-34.768555061, 21.43125, 3.302),
        (-34.768555061, 21.43125, -3.302),
        (34.768555061, 21.43125, 3.302),
        (34.768555061, 21.43125, -3.302),
    ]]
    fillet(fillet5_edges, radius=FILLET5_R)


solid = part.part
